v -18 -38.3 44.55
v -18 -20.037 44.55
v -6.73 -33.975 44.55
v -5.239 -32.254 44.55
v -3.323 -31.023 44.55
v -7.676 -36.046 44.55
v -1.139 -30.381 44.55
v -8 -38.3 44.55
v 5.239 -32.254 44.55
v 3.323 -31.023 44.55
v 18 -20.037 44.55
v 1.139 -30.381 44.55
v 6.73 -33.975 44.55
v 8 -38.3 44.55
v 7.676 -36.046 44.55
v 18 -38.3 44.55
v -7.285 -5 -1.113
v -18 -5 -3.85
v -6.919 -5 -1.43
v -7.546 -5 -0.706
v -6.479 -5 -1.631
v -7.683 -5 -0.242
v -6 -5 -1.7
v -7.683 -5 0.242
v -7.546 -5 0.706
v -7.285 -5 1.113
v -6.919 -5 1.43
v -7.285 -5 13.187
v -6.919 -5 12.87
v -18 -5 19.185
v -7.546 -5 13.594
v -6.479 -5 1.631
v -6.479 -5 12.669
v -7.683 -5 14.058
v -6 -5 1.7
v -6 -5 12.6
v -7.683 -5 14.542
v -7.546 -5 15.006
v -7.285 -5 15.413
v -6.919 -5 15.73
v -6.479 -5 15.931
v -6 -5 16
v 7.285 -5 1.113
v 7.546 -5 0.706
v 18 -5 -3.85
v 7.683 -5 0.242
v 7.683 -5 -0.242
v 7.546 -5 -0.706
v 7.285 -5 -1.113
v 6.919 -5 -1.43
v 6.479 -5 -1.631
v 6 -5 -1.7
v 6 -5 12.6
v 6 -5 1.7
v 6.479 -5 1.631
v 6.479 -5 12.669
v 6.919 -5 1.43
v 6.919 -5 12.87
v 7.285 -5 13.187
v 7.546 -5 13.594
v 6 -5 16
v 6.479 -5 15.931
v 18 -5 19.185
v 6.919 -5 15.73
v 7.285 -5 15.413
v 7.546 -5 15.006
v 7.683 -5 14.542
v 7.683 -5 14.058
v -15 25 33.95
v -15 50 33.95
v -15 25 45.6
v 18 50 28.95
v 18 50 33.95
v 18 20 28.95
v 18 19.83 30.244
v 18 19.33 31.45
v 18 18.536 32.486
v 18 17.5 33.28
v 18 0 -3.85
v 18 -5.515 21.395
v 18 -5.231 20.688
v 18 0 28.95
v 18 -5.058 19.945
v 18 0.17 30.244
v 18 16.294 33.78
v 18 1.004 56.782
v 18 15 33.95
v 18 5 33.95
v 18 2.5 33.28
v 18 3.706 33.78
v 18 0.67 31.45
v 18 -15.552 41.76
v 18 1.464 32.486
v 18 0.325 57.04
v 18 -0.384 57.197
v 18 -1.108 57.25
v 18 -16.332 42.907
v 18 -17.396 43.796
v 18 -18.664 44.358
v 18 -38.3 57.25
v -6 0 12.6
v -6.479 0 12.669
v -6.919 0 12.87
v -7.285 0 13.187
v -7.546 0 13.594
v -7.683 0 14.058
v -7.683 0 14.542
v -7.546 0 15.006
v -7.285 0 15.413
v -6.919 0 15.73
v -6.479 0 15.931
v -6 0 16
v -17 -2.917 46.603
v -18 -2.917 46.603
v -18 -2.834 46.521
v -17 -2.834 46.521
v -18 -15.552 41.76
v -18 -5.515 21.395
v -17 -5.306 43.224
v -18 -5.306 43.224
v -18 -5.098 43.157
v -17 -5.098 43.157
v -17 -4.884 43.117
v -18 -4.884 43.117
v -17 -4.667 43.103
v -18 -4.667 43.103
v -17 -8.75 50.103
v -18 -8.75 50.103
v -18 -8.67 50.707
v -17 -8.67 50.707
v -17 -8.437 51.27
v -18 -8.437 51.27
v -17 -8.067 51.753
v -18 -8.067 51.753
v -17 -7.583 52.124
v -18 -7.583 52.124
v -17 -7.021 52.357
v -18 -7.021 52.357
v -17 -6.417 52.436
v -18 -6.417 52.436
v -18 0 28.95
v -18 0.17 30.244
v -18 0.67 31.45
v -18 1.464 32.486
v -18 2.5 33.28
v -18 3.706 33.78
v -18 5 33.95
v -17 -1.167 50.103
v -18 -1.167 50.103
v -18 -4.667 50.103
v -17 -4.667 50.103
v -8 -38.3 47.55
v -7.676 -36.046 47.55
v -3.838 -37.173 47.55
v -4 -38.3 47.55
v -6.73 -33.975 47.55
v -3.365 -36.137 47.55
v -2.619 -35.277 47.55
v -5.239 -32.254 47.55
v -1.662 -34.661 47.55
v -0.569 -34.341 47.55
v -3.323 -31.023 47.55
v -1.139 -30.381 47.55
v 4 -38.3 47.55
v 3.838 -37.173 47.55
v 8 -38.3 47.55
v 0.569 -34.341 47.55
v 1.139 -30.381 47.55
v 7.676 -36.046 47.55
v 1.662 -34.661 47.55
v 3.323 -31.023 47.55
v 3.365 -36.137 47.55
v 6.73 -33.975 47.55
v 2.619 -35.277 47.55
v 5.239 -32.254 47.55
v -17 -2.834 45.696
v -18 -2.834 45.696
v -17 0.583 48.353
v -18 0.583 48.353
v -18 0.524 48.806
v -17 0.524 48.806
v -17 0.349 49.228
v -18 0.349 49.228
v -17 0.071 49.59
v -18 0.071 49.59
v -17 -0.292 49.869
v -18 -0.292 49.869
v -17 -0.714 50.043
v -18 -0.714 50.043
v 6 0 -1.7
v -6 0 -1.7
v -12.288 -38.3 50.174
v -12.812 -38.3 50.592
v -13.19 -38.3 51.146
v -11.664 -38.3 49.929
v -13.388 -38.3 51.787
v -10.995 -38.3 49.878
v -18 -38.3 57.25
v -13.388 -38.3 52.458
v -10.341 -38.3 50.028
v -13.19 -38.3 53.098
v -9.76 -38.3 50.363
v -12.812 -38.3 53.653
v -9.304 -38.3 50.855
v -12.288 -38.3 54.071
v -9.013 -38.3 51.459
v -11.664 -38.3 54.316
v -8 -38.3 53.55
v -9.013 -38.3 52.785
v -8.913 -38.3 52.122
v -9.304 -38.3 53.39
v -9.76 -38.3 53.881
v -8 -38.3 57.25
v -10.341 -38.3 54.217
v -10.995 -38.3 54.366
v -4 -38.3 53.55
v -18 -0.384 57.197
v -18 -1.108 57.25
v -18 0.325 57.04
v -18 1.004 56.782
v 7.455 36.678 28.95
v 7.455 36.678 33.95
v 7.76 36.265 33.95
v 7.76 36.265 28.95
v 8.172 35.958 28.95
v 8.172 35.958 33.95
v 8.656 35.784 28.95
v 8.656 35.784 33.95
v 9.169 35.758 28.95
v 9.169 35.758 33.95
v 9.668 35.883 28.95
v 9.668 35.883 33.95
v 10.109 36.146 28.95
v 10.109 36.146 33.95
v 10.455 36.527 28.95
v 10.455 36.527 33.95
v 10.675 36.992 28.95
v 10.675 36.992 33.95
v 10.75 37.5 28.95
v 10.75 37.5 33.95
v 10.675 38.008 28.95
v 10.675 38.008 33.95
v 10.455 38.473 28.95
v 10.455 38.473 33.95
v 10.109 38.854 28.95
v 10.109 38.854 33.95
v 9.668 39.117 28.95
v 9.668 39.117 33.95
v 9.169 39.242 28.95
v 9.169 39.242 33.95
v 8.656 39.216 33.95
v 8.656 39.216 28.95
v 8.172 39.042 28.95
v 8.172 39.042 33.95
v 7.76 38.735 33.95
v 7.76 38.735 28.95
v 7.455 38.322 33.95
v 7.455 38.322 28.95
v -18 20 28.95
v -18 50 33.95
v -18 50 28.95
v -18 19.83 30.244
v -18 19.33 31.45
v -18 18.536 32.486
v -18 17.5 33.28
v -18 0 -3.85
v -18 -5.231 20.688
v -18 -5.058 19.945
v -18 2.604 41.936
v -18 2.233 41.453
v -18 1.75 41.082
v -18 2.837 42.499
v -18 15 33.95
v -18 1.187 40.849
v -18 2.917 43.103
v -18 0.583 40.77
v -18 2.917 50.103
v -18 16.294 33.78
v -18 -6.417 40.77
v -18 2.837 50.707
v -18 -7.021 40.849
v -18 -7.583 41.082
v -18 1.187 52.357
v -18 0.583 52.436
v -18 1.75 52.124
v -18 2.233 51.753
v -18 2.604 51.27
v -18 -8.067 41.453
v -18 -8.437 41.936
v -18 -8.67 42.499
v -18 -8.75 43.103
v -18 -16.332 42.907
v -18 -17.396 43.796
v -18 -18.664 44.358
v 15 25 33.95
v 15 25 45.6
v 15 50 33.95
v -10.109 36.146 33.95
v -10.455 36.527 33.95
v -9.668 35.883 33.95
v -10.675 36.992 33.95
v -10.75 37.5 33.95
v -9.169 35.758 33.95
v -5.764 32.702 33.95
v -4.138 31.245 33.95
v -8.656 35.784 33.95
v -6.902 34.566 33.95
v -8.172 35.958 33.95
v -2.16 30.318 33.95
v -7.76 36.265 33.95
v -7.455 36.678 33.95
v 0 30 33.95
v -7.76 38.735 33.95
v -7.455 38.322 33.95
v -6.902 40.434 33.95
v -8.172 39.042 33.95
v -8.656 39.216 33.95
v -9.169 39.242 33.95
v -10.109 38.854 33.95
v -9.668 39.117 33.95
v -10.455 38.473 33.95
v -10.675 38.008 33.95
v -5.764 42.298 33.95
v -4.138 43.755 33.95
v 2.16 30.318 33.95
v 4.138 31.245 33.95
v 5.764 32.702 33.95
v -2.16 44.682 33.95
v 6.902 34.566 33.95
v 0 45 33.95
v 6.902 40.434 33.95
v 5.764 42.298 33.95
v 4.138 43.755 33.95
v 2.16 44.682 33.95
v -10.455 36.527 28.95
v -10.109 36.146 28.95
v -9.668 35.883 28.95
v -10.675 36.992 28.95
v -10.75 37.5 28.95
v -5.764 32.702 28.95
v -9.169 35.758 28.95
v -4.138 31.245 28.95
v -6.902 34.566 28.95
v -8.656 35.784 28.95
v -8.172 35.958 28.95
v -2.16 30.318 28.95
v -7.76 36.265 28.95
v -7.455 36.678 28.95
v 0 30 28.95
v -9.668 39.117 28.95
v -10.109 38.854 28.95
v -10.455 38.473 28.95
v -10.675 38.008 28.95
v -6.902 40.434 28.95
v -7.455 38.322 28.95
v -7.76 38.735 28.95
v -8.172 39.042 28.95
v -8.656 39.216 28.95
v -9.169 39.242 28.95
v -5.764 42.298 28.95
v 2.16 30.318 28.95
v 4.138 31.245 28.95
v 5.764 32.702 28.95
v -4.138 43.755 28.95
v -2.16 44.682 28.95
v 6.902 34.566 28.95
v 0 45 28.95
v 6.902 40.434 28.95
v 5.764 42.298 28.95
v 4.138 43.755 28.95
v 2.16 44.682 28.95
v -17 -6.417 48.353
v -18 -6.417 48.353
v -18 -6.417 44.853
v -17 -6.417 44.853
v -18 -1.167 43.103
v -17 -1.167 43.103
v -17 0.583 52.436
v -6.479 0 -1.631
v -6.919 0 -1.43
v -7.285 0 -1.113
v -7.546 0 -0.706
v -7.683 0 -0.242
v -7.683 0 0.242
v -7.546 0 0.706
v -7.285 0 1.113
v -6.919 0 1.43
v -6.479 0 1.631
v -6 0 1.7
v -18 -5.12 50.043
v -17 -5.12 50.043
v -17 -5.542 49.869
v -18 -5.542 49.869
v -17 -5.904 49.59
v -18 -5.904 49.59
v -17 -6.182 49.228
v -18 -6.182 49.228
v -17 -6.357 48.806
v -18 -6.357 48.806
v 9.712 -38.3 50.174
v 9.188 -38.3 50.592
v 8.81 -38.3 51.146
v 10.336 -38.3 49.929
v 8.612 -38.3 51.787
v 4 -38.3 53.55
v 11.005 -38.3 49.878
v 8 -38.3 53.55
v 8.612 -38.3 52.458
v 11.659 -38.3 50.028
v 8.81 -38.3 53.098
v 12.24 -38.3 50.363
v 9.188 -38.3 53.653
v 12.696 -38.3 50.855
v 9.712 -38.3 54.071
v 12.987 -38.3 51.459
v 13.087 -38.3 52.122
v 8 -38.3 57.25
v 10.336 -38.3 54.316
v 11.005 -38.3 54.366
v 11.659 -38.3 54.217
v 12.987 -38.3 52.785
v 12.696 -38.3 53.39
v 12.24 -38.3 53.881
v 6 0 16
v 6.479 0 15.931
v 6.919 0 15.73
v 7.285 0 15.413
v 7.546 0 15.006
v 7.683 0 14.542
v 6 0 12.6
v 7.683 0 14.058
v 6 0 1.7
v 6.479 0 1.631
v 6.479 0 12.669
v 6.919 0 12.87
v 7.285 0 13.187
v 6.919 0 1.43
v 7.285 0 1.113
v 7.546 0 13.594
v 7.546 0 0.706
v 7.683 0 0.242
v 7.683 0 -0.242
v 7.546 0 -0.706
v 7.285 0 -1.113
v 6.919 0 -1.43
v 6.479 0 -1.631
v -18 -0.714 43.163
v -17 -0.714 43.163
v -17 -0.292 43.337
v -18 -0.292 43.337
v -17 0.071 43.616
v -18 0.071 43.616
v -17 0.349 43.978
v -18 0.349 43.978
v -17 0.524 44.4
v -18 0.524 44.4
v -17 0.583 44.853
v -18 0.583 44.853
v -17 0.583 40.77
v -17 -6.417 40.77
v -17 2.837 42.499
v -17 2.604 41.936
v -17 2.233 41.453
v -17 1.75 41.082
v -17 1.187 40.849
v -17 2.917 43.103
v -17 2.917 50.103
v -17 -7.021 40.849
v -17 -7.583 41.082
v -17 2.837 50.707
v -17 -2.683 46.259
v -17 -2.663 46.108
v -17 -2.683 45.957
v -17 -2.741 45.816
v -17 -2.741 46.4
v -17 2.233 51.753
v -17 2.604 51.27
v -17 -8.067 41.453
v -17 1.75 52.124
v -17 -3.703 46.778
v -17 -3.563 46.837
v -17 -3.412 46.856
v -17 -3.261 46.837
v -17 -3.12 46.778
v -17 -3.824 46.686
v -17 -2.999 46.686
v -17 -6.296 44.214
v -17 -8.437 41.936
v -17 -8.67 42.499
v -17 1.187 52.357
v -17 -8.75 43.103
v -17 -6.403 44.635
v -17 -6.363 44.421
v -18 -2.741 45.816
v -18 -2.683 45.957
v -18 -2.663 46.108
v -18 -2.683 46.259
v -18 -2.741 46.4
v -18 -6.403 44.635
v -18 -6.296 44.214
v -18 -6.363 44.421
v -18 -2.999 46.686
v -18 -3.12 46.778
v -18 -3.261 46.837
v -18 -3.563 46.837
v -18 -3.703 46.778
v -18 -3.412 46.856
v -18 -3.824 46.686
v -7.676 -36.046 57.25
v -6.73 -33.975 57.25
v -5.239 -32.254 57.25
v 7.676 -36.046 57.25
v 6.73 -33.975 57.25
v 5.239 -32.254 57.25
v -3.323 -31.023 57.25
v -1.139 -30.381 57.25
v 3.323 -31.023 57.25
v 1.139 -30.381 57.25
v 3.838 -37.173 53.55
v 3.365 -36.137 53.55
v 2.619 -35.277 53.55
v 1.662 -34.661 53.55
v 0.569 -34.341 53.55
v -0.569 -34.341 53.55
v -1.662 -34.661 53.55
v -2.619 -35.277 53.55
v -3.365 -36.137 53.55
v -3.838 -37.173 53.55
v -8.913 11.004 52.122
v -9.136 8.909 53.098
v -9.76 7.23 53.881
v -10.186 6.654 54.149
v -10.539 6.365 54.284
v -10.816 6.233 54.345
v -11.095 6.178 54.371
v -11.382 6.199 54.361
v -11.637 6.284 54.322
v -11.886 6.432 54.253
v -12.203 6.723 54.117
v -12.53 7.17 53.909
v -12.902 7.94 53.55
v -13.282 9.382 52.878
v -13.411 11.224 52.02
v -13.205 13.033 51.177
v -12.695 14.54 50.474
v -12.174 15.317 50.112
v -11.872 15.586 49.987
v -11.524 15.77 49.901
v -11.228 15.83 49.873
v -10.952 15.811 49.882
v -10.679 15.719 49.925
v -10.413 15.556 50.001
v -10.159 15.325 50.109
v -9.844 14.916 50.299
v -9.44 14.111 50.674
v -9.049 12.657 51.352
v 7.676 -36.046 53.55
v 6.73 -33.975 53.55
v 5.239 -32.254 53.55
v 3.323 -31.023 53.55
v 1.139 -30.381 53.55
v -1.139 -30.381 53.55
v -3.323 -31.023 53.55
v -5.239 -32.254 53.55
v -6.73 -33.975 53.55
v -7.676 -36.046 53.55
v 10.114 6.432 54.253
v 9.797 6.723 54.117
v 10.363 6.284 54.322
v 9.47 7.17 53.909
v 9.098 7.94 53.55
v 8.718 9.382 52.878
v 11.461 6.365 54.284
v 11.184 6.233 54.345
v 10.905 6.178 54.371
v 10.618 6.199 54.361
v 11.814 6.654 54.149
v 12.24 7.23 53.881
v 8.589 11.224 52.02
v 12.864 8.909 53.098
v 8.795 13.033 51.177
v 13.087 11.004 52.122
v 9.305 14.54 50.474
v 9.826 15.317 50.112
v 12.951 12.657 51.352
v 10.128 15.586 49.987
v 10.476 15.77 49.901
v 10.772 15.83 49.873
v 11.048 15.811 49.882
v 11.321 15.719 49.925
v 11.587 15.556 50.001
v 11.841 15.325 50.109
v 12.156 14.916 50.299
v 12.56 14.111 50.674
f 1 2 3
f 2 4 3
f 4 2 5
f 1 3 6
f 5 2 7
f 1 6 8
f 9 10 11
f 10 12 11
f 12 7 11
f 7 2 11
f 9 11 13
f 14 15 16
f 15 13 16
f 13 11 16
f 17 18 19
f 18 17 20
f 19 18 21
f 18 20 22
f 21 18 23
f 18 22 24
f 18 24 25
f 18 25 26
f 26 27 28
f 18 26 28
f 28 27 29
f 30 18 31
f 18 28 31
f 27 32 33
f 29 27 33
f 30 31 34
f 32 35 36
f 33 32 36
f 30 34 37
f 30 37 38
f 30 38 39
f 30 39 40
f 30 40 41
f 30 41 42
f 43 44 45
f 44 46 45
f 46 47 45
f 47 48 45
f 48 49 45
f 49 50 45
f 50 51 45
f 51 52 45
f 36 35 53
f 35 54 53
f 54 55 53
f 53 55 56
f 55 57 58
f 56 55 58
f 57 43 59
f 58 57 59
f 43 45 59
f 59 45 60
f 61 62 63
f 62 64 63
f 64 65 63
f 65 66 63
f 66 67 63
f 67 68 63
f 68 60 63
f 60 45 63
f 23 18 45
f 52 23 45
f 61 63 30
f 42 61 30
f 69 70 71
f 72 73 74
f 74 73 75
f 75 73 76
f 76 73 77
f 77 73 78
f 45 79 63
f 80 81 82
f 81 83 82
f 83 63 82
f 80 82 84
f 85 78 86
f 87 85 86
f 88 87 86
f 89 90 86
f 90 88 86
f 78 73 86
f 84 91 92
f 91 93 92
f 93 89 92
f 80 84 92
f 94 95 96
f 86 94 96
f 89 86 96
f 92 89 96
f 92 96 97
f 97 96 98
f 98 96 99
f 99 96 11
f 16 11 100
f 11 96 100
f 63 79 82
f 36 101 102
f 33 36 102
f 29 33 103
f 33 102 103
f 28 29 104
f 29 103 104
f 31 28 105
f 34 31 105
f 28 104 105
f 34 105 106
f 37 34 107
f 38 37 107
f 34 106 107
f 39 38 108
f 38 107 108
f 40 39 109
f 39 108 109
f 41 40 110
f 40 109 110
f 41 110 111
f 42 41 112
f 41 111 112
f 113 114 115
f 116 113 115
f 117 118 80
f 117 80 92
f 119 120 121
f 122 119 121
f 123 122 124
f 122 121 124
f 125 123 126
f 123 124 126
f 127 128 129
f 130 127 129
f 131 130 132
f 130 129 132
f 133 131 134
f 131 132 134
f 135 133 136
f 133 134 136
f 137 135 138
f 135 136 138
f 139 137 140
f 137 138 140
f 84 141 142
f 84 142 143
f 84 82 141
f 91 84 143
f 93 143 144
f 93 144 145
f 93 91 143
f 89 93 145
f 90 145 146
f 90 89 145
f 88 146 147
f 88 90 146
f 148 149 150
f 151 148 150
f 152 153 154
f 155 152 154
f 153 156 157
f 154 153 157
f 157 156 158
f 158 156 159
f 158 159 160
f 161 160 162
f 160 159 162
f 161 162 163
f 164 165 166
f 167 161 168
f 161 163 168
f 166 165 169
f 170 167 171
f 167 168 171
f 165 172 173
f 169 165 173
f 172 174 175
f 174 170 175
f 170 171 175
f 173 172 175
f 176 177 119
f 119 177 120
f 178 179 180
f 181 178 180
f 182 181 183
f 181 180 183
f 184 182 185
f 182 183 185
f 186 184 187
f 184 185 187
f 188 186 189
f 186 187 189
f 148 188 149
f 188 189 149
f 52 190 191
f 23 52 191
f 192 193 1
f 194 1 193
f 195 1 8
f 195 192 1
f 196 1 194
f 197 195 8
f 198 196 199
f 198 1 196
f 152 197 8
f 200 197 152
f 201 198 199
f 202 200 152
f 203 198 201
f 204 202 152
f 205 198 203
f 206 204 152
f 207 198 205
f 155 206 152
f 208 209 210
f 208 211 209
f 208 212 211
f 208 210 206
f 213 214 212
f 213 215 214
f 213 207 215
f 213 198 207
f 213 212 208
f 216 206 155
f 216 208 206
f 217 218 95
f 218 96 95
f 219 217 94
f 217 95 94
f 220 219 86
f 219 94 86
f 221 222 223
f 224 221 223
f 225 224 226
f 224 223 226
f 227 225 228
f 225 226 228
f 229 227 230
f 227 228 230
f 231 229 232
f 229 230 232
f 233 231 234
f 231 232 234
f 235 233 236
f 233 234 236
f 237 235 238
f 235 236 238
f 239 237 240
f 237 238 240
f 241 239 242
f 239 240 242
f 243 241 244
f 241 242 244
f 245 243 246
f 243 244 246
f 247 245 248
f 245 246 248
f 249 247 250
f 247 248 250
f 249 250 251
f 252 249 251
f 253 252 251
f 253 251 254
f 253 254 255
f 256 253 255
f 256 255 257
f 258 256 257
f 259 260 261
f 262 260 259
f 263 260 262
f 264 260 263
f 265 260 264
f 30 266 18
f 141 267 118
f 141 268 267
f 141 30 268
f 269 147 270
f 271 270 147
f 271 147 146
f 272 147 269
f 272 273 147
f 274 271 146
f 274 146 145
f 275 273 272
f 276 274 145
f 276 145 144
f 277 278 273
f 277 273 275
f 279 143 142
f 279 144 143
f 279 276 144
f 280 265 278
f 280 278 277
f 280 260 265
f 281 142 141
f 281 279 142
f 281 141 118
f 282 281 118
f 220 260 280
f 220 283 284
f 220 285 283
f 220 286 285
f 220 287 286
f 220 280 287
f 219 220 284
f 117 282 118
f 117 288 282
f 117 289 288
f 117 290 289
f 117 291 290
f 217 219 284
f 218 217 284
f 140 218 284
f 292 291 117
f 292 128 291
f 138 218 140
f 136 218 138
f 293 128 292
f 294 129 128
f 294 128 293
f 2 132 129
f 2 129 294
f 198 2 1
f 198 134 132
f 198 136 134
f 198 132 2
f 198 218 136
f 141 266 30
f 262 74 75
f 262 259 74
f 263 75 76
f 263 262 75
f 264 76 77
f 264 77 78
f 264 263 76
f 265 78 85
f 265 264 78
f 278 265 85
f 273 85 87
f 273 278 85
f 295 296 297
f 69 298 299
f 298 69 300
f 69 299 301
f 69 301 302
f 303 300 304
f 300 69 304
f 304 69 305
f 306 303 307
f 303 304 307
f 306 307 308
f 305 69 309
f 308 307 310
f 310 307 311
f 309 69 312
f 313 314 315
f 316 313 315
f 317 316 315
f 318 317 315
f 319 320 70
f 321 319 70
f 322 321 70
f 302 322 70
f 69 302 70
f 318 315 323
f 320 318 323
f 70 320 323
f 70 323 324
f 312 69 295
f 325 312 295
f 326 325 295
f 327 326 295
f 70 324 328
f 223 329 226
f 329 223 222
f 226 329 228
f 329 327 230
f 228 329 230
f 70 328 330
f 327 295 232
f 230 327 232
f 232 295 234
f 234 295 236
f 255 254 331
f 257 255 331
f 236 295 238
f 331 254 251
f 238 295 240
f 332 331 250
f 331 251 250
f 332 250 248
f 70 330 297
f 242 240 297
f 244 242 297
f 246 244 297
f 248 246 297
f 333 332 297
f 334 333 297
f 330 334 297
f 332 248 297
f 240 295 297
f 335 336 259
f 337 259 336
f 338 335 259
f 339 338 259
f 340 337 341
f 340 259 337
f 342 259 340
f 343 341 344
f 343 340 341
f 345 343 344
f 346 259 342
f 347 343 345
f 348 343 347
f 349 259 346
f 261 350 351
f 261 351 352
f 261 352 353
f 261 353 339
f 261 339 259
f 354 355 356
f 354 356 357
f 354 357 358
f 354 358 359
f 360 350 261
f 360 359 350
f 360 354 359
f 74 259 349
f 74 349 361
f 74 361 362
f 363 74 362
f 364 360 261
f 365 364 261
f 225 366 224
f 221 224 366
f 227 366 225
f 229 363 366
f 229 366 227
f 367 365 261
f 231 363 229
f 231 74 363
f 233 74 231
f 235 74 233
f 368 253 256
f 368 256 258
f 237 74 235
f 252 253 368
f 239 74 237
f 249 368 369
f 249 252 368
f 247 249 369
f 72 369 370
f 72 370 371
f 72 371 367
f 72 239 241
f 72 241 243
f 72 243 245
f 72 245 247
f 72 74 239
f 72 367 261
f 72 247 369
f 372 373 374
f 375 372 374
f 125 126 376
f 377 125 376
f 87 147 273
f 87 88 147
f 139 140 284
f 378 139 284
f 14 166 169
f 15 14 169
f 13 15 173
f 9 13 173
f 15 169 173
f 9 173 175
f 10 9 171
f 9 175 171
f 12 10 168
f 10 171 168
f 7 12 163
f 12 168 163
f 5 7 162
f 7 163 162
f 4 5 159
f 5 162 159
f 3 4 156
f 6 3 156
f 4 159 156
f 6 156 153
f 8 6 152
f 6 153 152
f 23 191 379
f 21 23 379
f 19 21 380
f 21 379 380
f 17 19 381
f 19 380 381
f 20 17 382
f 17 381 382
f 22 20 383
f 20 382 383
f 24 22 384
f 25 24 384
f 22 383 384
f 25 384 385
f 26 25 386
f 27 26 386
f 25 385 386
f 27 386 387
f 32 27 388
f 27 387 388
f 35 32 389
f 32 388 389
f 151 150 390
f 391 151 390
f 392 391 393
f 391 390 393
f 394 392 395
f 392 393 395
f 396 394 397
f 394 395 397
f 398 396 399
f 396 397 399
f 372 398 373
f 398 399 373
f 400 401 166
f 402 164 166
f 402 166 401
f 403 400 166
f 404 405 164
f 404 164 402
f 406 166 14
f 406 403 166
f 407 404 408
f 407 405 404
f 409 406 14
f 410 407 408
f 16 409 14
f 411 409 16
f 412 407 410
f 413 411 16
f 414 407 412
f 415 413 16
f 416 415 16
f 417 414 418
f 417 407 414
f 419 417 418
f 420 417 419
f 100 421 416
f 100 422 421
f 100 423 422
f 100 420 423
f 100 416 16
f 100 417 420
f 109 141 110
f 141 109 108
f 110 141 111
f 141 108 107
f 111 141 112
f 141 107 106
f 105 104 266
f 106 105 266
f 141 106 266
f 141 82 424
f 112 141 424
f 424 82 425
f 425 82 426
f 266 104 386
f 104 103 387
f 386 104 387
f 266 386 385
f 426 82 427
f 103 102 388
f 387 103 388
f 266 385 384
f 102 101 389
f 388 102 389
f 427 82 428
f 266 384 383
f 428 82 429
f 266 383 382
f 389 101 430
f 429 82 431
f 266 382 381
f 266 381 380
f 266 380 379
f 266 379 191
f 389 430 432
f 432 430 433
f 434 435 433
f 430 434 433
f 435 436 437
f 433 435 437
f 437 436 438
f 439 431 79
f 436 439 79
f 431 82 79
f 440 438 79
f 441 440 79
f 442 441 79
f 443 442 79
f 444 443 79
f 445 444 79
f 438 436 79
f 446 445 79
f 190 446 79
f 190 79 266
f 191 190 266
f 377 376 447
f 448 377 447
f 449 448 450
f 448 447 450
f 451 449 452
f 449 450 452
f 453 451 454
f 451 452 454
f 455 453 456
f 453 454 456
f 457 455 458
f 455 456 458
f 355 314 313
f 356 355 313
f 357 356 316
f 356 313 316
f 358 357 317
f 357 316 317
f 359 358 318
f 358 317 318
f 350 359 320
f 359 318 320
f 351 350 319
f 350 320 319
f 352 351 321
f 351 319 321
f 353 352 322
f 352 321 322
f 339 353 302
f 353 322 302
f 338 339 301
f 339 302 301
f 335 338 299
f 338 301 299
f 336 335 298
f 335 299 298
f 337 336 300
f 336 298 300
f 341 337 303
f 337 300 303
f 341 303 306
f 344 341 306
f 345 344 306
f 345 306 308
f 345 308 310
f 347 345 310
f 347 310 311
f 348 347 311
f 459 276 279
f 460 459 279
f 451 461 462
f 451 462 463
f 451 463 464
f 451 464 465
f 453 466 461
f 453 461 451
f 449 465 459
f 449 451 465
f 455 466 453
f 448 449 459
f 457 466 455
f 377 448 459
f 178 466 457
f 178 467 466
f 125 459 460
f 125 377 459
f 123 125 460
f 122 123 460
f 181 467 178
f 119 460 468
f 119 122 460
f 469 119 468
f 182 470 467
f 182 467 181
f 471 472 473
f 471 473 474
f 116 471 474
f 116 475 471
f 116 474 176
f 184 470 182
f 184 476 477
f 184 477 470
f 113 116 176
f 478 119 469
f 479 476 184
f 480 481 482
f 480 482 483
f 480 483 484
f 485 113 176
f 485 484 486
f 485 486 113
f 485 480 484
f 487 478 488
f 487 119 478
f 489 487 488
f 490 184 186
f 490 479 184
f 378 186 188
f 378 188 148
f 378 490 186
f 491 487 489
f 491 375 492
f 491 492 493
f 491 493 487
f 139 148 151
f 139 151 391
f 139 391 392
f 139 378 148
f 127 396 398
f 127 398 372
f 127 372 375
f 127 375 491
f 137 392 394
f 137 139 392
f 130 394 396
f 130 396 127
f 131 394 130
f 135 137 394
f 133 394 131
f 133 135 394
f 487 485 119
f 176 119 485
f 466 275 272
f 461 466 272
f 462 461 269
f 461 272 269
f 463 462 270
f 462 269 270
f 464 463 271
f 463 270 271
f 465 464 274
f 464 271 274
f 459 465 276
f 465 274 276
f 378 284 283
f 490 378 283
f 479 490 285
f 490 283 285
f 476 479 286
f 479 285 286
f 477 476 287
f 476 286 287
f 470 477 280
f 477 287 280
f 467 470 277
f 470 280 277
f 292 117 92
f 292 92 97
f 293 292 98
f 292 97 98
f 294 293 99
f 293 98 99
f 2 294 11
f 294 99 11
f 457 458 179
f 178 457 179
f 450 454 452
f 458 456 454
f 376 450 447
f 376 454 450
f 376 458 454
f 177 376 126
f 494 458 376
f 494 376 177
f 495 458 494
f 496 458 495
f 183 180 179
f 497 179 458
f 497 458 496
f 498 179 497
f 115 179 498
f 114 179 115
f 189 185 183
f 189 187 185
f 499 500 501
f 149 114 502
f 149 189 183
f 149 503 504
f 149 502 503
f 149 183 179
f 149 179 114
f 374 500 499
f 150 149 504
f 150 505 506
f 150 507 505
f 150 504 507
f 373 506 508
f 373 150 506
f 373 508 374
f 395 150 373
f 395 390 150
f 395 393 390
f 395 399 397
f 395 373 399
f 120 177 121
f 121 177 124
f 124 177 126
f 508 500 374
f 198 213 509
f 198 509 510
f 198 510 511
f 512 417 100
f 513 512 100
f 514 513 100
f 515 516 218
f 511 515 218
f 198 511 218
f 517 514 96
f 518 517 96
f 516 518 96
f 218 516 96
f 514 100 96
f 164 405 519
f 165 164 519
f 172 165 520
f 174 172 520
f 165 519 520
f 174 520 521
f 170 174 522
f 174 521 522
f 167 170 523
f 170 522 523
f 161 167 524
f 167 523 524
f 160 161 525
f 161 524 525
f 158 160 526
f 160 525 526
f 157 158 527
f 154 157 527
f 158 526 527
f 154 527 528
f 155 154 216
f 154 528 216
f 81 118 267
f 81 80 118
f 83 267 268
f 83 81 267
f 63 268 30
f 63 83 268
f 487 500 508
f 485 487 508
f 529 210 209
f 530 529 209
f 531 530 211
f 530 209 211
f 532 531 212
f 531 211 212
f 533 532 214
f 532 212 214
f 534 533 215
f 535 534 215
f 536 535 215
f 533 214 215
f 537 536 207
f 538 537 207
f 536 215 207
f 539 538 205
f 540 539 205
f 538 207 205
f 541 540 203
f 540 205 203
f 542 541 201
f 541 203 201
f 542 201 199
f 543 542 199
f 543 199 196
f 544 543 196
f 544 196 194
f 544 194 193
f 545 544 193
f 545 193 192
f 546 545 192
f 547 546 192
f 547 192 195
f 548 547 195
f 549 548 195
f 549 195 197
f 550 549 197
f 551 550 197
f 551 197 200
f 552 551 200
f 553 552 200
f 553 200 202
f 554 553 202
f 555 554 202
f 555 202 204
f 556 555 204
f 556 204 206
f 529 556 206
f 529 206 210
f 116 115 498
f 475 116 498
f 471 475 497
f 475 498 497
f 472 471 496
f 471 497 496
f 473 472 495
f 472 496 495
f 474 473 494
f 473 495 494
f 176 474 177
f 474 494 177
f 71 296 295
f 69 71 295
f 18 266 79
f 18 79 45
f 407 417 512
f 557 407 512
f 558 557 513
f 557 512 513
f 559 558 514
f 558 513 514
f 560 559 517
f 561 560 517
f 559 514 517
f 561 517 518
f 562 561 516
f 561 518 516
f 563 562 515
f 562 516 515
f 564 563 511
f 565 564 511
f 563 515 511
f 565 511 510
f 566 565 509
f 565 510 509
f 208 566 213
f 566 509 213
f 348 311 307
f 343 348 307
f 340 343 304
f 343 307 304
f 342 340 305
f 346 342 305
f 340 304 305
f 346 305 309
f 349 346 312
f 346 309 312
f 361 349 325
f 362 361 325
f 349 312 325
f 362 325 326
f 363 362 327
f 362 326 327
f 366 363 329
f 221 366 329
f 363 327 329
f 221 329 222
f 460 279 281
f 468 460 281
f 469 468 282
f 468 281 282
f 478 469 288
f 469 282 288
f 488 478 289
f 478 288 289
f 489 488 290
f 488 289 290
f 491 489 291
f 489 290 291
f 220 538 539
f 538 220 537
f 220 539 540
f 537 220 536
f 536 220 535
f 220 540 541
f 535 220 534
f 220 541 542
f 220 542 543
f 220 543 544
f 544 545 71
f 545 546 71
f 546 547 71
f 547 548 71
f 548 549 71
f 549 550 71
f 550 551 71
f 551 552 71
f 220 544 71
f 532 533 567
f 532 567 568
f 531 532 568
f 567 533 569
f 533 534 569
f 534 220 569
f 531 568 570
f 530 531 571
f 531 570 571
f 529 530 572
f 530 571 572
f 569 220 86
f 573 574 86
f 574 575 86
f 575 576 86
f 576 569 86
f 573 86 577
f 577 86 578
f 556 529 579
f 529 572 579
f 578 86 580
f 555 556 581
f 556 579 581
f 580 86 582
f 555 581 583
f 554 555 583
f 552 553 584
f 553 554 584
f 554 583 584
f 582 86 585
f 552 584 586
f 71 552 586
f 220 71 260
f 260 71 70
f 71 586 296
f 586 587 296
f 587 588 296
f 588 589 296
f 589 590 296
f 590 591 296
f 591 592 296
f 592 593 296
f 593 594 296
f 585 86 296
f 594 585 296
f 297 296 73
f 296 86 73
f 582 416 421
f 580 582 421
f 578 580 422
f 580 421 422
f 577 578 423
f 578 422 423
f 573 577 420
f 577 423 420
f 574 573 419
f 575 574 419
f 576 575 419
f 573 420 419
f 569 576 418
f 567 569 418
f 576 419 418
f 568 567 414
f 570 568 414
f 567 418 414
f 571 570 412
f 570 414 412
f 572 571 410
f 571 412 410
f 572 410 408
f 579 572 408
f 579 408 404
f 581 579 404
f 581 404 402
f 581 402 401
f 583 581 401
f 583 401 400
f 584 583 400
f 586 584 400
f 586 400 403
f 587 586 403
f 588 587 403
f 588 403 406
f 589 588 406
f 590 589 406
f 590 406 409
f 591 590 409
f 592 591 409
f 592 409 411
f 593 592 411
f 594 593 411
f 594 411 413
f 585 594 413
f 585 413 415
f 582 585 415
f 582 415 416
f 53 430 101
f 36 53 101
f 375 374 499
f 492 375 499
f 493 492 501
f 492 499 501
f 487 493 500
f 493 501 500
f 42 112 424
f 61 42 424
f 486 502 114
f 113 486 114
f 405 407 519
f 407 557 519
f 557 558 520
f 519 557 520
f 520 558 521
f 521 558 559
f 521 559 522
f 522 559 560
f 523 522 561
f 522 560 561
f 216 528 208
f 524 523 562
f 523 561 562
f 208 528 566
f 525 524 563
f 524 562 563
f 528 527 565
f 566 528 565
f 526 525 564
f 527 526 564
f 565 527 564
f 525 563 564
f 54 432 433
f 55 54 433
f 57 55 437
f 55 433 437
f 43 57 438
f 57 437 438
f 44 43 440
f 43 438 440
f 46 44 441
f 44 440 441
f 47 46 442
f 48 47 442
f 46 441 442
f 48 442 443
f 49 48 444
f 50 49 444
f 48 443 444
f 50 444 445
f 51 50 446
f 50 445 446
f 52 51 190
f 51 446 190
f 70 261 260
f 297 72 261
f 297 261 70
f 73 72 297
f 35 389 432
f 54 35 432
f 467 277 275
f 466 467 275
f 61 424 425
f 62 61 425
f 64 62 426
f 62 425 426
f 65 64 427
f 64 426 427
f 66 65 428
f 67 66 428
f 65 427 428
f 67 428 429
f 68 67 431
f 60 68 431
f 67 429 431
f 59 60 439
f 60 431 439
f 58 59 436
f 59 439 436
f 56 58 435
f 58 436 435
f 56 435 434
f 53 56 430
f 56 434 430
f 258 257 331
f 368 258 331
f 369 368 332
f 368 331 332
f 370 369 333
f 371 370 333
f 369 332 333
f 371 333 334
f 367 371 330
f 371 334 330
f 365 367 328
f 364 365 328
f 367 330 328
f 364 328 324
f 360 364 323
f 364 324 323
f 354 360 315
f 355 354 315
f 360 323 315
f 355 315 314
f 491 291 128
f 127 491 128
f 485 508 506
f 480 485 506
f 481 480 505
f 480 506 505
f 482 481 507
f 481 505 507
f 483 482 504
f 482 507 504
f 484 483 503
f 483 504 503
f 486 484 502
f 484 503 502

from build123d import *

# Parameters (mm, degrees)
F0_W      = 30
F0_H      = 22
F1_DEPTH  = 5
F2_DEPTH  = 39.1
F3_W      = 30
F3_H      = 12.7
F4_DEPTH  = 50
F8_W      = 30
F8_H      = 5
F9_DEPTH  = 25
F10_W     = 30
F10_H     = 5
F11_DEPTH = 5
F12_W     = 30
F12_H     = 5
F13_DEPTH = 25
F15_DEPTH = 25
F16_DEPTH = 3
F18_DEPTH = 3
F19_DEPTH = 3
F21_DEPTH = 3
F23_DEPTH = 30
F24_R     = 2.25
F25_DEPTH = 500
F26_W     = 68.0921077728
F26_H     = 72.8289508261
F27_DEPTH = 25
F29_DEPTH = 36
F30_R     = 4.99999
F32_DEPTH = 1


# Not quite as in the source:
# - a fillet or chamfer is up to 0.001 mm smaller than in the source, because OpenCascade refuses the exact size


with BuildPart() as f1:
    # F0 (on Front) → F1 (new body)
    with BuildSketch(Plane.XZ):
        with Locations((0, 7.15)):
            Rectangle(F0_W, F0_H)
        with BuildLine():
            ThreePointArc((-6, -1.7), (-7.7, 0), (-6, 1.7))
            Line((-6, 1.7), (6, 1.7))
            ThreePointArc((6, 1.7), (7.7, 0), (6, -1.7))
            Line((6, -1.7), (-6, -1.7))
        make_face(mode=Mode.SUBTRACT)
        with BuildLine():
            ThreePointArc((-6, 12.6), (-7.7, 14.3), (-6, 16))
            Line((-6, 16), (6, 16))
            ThreePointArc((6, 16), (7.7, 14.3), (6, 12.6))
            Line((6, 12.6), (-6, 12.6))
        make_face(mode=Mode.SUBTRACT)
    extrude(amount=F1_DEPTH)

    # F2 (add): a face of the model
    f2_faces = [f1.faces().sort_by_distance(p)[0] for p in [
        (0, -2.5, 18.15),
    ]]
    extrude(f2_faces, amount=F2_DEPTH)

    # F3 (on face) → F4 (join)
    with BuildSketch(Plane.XZ.offset(5)):
        with Locations((0, 50.9)):
            Rectangle(F3_W, F3_H)
    extrude(amount=F4_DEPTH)

    # F6 (on offset) → F7 (revolve, cut)
    with BuildSketch(Plane.XZ.offset(38.3)):
        Polygon((8, 57.25), (0, 57.25), (0, 44.55), (8, 44.55), (8, 47.55), (4, 47.55), (4, 53.55), (8, 53.55), align=None)
    revolve(axis=Axis((0, -38.3, 50.9), (0, 0, 1)), mode=Mode.SUBTRACT)

    # F8 (on face) → F9 (join)
    with BuildSketch(Plane(origin=(0, 0, 0), x_dir=(-1, 0, 0), z_dir=(0, 1, 0))):
        with Locations((0, 36.45)):
            Rectangle(F8_W, F8_H)
    extrude(amount=F9_DEPTH)

    # F10 (on face) → F11 (join)
    with BuildSketch(Plane(origin=(0, 0, 33.95), x_dir=(1, 0, 0), z_dir=(0, 0, -1))):
        with Locations((0, -22.5)):
            Rectangle(F10_W, F10_H)
    extrude(amount=F11_DEPTH)

    # F12 (on face) → F13 (join)
    with BuildSketch(Plane(origin=(0, 25, 0), x_dir=(-1, 0, 0), z_dir=(0, 1, 0))):
        with Locations((0, 31.45)):
            Rectangle(F12_W, F12_H)
    extrude(amount=F13_DEPTH)

    # F14 (on face) → F15 (cut)
    with BuildSketch(Plane.XY.offset(33.95)):
        with BuildLine():
            ThreePointArc((7.4548611111, 38.3216117173), (0, 45), (-7.4548611111, 38.3216117173))
            ThreePointArc((-7.4548611111, 38.3216117173), (-10.75, 37.5), (-7.4548611111, 36.6783882827))
            ThreePointArc((-7.4548611111, 36.6783882827), (0, 30), (7.4548611111, 36.6783882827))
            ThreePointArc((7.4548611111, 36.6783882827), (10.75, 37.5), (7.4548611111, 38.3216117173))
        make_face()
    extrude(amount=-F15_DEPTH, mode=Mode.SUBTRACT)

    # F16 (add): a face of the model
    f16_faces = [f1.faces().sort_by_distance(p)[0] for p in [
        (15, -2.5, -2.6351662665),
    ]]
    extrude(f16_faces, amount=F16_DEPTH)

    # F17 (on face) → F18 (join)
    with BuildSketch(Plane.YZ.offset(18)):
        Polygon((50, 33.95), (0, 57.25), (0, 38.95), (25, 38.95), (25, 33.95), align=None)
    extrude(amount=-F18_DEPTH)

    # F19 (add): a face of the model
    f19_faces = [f1.faces().sort_by_distance(p)[0] for p in [
        (-15, -2.5, -2.6351662665),
    ]]
    extrude(f19_faces, amount=F19_DEPTH)

    # F20 (on face) → F21 (join)
    with BuildSketch(Plane(origin=(-18, 0, 0), x_dir=(0, -1, 0), z_dir=(-1, 0, 0))):
        Polygon((0, 57.25), (-50, 33.95), (-25, 33.95), (-25, 38.95), (0, 38.95), align=None)
    extrude(amount=-F21_DEPTH)

    # F22 (on face) → F23 (join, through all)
    with BuildSketch(Plane(origin=(15, 0, 0), x_dir=(0, -1, 0), z_dir=(-1, 0, 0))):
        Polygon((-25, 45.6), (-25, 38.95), (0, 38.95), (0, 57.25), align=None)
    extrude(amount=F23_DEPTH)

    # F24 (on face) → F25 (cut)
    with BuildSketch(Plane.XZ.offset(55)):
        with Locations((-11.1628601777, 52.1221570671)):
            Circle(F24_R)
        with Locations((10.8371398223, 52.1221570671)):
            Circle(F24_R)
    extrude(amount=-F25_DEPTH, mode=Mode.SUBTRACT)

    # F26 (on offset) → F27 (cut)
    with BuildSketch(Plane.XZ.offset(38.3)):
        with Locations((0.2960525453, 29.3092119973)):
            Rectangle(F26_W, F26_H)
    extrude(amount=F27_DEPTH, mode=Mode.SUBTRACT)

    # F28 (on face) → F29 (join)
    with BuildSketch(Plane(origin=(-18, 0, 0), x_dir=(0, -1, 0), z_dir=(-1, 0, 0))):
        Polygon((5, 44.55), (5, 20.35), (16.9268529862, 44.55), align=None)
    extrude(amount=-F29_DEPTH)

    # F30 (radius 5 in the source; OpenCascade refuses exactly that, so slightly less here)
    f30_edges = [f1.edges().sort_by_distance(p)[0] for p in [
        (0, -16.926853, 44.55),
        (0, 0, 57.25),
        (0, 20, 33.95),
        (0, 0, 33.95),
        (0, -5, 20.35),
    ]]
    fillet(f30_edges, radius=F30_R)

    # F31 (on face) → F32 (cut)
    with BuildSketch(Plane(origin=(-18, 0, 0), x_dir=(0, -1, 0), z_dir=(-1, 0, 0))):
        with BuildLine():
            ThreePointArc((-2.9166666459, 43.103029569), (-2.2332491353, 41.4531137462), (-0.5833333125, 40.7696962357))
            Line((-0.5833333125, 40.7696962357), (6.4166666875, 40.7696962357))
            ThreePointArc((6.4166666875, 40.7696962357), (8.0665825102, 41.4531137462), (8.7500000208, 43.103029569))
            Line((8.7500000208, 43.103029569), (8.7500000208, 50.103029569))
            ThreePointArc((8.7500000208, 50.103029569), (8.0665825102, 51.7529453918), (6.4166666875, 52.4363629023))
            Line((6.4166666875, 52.4363629023), (-0.5833333125, 52.4363629023))
            ThreePointArc((-0.5833333125, 52.4363629023), (-2.2332491353, 51.7529453918), (-2.9166666459, 50.103029569))
            Line((-2.9166666459, 50.103029569), (-2.9166666459, 43.103029569))
        make_face()
        with BuildLine():
            Line((4.6666666875, 43.103029569), (1.1666666875, 43.103029569))
            ThreePointArc((1.1666666875, 43.103029569), (-0.0707701796, 43.6155927019), (-0.5833333125, 44.853029569))
            Line((-0.5833333125, 44.853029569), (-0.5833333125, 48.353029569))
            ThreePointArc((-0.5833333125, 48.353029569), (-0.0707701796, 49.5904664361), (1.1666666875, 50.103029569))
            Line((1.1666666875, 50.103029569), (4.6666666875, 50.103029569))
            ThreePointArc((4.6666666875, 50.103029569), (5.9041035545, 49.5904664361), (6.4166666875, 48.353029569))
            Line((6.4166666875, 48.353029569), (6.4166666875, 44.853029569))
            ThreePointArc((6.4166666875, 44.853029569), (6.3861771815, 44.5277855668), (6.2957710749, 44.2138747406))
            Line((6.2957710875, 44.2138747357), (3.8241204375, 46.6855253857))
            ThreePointArc((3.8241204265, 46.6855253747), (3.4116414708, 46.8563797523), (2.9991625151, 46.6855253747))
            Line((2.9991625041, 46.6855253857), (2.9166666875, 46.603029569))
            Line((2.9166666875, 46.603029569), (2.8341708708, 46.5205337523))
            ThreePointArc((2.8341708818, 46.5205337413), (2.6633165041, 46.1080547857), (2.8341708818, 45.69557583))
            Line((2.8341708708, 45.695575819), (5.3058215208, 43.223925169))
            ThreePointArc((5.3058215159, 43.2239251815), (4.9919106896, 43.133519075), (4.6666666875, 43.103029569))
        make_face(mode=Mode.SUBTRACT)
    extrude(amount=-F32_DEPTH, mode=Mode.SUBTRACT)


solid = f1.part
